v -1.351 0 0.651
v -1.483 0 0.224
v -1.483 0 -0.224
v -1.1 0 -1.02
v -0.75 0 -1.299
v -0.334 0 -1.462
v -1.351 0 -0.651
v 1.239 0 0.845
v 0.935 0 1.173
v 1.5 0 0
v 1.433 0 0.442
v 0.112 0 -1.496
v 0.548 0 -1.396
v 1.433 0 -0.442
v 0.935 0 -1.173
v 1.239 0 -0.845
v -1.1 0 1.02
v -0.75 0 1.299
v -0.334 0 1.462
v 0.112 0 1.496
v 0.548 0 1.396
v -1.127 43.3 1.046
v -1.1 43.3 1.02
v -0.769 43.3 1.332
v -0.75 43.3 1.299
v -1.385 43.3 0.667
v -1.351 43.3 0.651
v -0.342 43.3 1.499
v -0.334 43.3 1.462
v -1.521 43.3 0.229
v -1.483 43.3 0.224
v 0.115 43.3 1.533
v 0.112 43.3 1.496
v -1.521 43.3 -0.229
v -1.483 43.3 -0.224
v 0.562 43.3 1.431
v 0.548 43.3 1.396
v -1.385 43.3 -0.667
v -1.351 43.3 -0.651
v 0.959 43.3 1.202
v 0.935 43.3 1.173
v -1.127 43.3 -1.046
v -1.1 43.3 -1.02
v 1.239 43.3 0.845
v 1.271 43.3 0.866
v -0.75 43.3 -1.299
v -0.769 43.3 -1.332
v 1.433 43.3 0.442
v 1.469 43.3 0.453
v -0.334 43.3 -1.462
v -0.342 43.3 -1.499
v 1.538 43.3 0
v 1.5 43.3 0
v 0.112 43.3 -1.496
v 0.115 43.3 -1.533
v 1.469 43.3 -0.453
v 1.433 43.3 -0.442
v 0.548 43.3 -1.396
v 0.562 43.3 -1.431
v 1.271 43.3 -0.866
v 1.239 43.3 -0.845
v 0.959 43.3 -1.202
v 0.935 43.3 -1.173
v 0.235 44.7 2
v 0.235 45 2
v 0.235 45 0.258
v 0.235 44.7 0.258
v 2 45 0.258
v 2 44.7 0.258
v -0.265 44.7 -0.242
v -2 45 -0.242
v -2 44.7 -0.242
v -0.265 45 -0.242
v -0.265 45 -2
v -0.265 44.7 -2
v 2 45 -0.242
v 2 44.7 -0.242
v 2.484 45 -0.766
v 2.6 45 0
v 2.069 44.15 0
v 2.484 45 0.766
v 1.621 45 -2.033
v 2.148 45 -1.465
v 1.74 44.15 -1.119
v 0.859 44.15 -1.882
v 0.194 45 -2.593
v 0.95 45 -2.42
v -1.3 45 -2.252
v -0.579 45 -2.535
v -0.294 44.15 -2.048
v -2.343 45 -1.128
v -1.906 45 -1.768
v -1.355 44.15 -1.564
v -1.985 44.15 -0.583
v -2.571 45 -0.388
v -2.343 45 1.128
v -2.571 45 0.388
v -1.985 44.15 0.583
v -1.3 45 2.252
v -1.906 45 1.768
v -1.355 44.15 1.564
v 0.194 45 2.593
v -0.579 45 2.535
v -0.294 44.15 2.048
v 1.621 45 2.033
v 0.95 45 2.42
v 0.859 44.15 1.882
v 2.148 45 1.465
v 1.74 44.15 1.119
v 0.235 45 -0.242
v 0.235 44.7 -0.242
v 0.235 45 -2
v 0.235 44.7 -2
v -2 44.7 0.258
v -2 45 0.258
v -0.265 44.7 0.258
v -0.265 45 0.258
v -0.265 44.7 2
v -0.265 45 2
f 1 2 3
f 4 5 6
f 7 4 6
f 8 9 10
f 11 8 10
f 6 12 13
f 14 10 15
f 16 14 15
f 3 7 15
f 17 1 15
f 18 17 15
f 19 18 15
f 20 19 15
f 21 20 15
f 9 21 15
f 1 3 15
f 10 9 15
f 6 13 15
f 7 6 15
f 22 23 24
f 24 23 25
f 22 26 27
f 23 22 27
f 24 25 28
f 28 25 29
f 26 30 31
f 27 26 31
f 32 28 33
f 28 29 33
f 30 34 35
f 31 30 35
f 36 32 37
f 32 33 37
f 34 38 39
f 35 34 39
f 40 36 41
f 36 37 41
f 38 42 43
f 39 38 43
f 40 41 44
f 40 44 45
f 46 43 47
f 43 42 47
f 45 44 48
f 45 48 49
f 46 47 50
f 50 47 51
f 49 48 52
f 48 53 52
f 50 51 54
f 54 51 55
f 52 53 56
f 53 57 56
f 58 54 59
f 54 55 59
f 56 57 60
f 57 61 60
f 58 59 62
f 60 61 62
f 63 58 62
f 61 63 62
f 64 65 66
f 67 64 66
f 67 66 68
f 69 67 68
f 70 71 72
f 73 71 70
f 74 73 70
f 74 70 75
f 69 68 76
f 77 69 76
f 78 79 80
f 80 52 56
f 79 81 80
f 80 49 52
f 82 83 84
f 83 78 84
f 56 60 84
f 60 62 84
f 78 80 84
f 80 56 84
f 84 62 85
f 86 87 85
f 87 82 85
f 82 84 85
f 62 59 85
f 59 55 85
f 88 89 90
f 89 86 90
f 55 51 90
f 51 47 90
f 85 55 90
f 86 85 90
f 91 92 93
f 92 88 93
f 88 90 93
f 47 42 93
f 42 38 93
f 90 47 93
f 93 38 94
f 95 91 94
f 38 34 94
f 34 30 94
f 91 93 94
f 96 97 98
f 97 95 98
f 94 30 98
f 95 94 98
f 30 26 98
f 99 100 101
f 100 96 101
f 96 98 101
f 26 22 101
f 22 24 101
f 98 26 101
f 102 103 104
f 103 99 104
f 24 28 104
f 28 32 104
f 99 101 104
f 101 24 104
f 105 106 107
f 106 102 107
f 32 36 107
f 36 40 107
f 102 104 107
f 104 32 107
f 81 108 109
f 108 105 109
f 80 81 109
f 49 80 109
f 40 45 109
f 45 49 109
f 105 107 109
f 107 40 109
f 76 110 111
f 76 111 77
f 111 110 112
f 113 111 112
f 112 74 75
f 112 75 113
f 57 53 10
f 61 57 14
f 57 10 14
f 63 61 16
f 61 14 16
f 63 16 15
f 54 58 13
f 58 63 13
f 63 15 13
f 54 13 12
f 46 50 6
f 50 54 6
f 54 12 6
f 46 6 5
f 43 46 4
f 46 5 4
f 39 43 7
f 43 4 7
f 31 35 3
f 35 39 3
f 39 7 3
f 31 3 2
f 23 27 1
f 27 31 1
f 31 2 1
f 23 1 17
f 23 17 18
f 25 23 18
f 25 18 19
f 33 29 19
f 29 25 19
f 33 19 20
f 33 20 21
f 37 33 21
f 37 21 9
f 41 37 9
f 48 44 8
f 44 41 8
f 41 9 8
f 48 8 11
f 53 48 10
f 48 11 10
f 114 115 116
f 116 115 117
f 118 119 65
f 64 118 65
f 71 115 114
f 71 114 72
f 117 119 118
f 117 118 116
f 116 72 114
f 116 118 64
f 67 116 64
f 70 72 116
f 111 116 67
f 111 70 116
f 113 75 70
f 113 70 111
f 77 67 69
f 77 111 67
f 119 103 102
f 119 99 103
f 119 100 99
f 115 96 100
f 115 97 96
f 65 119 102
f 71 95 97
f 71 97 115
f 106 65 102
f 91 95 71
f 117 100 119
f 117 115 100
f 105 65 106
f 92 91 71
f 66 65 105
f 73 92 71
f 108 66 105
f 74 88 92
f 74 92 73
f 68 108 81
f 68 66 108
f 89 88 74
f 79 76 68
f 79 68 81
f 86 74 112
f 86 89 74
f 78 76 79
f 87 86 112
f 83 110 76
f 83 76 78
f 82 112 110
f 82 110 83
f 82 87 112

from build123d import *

# Parameters (mm, degrees)
SKETCH1_R           = 1.5
BOSS_EXTRUDE1_DEPTH = 45
SKETCH2_R           = 2.6
BOSS_EXTRUDE2_DEPTH = 1.7
BOSS_EXTRUDE2_TAPER = 32
SKETCH3_W           = 0.5
SKETCH3_H           = 1.758378485
SKETCH3_H_2         = 1.741621515
SKETCH3_W_2         = 1.734727157
SKETCH3_H_3         = 0.5
SKETCH3_W_3         = 1.765272843
CUT_EXTRUDE1_DEPTH  = 0.3


with BuildPart() as part:
    # Sketch1 → Boss-Extrude1 (new body)
    with BuildSketch(Plane(origin=(0, 0, 0), x_dir=(1, 0, 0), z_dir=(0, 1, 0))):
        Circle(SKETCH1_R)
    extrude(amount=BOSS_EXTRUDE1_DEPTH)

    # Sketch2 → Boss-Extrude2 (add)
    with BuildSketch(Plane(origin=(0, 45, 0), x_dir=(1, 0, 0), z_dir=(0, 1, 0))):
        Circle(SKETCH2_R)
    extrude(amount=-BOSS_EXTRUDE2_DEPTH, taper=BOSS_EXTRUDE2_TAPER)

    # Sketch3 → Cut-Extrude1 (cut)
    with BuildSketch(Plane(origin=(0, 45, 0), x_dir=(1, 0, 0), z_dir=(0, 1, 0))):
        with Locations((-0.015272843, 1.120810757)):
            Rectangle(SKETCH3_W, SKETCH3_H)
        with Locations((-0.015272843, -1.129189243)):
            Rectangle(SKETCH3_W, SKETCH3_H_2)
        with Locations((-1.132636421, -0.008378485)):
            Rectangle(SKETCH3_W_2, SKETCH3_H_3)
        with Locations((1.117363579, -0.008378485)):
            Rectangle(SKETCH3_W_3, SKETCH3_H_3)
        with Locations((-0.015272843, -0.008378485)):
            Rectangle(SKETCH3_W, SKETCH3_H_3)
    extrude(amount=-CUT_EXTRUDE1_DEPTH, mode=Mode.SUBTRACT)


solid = part.part
